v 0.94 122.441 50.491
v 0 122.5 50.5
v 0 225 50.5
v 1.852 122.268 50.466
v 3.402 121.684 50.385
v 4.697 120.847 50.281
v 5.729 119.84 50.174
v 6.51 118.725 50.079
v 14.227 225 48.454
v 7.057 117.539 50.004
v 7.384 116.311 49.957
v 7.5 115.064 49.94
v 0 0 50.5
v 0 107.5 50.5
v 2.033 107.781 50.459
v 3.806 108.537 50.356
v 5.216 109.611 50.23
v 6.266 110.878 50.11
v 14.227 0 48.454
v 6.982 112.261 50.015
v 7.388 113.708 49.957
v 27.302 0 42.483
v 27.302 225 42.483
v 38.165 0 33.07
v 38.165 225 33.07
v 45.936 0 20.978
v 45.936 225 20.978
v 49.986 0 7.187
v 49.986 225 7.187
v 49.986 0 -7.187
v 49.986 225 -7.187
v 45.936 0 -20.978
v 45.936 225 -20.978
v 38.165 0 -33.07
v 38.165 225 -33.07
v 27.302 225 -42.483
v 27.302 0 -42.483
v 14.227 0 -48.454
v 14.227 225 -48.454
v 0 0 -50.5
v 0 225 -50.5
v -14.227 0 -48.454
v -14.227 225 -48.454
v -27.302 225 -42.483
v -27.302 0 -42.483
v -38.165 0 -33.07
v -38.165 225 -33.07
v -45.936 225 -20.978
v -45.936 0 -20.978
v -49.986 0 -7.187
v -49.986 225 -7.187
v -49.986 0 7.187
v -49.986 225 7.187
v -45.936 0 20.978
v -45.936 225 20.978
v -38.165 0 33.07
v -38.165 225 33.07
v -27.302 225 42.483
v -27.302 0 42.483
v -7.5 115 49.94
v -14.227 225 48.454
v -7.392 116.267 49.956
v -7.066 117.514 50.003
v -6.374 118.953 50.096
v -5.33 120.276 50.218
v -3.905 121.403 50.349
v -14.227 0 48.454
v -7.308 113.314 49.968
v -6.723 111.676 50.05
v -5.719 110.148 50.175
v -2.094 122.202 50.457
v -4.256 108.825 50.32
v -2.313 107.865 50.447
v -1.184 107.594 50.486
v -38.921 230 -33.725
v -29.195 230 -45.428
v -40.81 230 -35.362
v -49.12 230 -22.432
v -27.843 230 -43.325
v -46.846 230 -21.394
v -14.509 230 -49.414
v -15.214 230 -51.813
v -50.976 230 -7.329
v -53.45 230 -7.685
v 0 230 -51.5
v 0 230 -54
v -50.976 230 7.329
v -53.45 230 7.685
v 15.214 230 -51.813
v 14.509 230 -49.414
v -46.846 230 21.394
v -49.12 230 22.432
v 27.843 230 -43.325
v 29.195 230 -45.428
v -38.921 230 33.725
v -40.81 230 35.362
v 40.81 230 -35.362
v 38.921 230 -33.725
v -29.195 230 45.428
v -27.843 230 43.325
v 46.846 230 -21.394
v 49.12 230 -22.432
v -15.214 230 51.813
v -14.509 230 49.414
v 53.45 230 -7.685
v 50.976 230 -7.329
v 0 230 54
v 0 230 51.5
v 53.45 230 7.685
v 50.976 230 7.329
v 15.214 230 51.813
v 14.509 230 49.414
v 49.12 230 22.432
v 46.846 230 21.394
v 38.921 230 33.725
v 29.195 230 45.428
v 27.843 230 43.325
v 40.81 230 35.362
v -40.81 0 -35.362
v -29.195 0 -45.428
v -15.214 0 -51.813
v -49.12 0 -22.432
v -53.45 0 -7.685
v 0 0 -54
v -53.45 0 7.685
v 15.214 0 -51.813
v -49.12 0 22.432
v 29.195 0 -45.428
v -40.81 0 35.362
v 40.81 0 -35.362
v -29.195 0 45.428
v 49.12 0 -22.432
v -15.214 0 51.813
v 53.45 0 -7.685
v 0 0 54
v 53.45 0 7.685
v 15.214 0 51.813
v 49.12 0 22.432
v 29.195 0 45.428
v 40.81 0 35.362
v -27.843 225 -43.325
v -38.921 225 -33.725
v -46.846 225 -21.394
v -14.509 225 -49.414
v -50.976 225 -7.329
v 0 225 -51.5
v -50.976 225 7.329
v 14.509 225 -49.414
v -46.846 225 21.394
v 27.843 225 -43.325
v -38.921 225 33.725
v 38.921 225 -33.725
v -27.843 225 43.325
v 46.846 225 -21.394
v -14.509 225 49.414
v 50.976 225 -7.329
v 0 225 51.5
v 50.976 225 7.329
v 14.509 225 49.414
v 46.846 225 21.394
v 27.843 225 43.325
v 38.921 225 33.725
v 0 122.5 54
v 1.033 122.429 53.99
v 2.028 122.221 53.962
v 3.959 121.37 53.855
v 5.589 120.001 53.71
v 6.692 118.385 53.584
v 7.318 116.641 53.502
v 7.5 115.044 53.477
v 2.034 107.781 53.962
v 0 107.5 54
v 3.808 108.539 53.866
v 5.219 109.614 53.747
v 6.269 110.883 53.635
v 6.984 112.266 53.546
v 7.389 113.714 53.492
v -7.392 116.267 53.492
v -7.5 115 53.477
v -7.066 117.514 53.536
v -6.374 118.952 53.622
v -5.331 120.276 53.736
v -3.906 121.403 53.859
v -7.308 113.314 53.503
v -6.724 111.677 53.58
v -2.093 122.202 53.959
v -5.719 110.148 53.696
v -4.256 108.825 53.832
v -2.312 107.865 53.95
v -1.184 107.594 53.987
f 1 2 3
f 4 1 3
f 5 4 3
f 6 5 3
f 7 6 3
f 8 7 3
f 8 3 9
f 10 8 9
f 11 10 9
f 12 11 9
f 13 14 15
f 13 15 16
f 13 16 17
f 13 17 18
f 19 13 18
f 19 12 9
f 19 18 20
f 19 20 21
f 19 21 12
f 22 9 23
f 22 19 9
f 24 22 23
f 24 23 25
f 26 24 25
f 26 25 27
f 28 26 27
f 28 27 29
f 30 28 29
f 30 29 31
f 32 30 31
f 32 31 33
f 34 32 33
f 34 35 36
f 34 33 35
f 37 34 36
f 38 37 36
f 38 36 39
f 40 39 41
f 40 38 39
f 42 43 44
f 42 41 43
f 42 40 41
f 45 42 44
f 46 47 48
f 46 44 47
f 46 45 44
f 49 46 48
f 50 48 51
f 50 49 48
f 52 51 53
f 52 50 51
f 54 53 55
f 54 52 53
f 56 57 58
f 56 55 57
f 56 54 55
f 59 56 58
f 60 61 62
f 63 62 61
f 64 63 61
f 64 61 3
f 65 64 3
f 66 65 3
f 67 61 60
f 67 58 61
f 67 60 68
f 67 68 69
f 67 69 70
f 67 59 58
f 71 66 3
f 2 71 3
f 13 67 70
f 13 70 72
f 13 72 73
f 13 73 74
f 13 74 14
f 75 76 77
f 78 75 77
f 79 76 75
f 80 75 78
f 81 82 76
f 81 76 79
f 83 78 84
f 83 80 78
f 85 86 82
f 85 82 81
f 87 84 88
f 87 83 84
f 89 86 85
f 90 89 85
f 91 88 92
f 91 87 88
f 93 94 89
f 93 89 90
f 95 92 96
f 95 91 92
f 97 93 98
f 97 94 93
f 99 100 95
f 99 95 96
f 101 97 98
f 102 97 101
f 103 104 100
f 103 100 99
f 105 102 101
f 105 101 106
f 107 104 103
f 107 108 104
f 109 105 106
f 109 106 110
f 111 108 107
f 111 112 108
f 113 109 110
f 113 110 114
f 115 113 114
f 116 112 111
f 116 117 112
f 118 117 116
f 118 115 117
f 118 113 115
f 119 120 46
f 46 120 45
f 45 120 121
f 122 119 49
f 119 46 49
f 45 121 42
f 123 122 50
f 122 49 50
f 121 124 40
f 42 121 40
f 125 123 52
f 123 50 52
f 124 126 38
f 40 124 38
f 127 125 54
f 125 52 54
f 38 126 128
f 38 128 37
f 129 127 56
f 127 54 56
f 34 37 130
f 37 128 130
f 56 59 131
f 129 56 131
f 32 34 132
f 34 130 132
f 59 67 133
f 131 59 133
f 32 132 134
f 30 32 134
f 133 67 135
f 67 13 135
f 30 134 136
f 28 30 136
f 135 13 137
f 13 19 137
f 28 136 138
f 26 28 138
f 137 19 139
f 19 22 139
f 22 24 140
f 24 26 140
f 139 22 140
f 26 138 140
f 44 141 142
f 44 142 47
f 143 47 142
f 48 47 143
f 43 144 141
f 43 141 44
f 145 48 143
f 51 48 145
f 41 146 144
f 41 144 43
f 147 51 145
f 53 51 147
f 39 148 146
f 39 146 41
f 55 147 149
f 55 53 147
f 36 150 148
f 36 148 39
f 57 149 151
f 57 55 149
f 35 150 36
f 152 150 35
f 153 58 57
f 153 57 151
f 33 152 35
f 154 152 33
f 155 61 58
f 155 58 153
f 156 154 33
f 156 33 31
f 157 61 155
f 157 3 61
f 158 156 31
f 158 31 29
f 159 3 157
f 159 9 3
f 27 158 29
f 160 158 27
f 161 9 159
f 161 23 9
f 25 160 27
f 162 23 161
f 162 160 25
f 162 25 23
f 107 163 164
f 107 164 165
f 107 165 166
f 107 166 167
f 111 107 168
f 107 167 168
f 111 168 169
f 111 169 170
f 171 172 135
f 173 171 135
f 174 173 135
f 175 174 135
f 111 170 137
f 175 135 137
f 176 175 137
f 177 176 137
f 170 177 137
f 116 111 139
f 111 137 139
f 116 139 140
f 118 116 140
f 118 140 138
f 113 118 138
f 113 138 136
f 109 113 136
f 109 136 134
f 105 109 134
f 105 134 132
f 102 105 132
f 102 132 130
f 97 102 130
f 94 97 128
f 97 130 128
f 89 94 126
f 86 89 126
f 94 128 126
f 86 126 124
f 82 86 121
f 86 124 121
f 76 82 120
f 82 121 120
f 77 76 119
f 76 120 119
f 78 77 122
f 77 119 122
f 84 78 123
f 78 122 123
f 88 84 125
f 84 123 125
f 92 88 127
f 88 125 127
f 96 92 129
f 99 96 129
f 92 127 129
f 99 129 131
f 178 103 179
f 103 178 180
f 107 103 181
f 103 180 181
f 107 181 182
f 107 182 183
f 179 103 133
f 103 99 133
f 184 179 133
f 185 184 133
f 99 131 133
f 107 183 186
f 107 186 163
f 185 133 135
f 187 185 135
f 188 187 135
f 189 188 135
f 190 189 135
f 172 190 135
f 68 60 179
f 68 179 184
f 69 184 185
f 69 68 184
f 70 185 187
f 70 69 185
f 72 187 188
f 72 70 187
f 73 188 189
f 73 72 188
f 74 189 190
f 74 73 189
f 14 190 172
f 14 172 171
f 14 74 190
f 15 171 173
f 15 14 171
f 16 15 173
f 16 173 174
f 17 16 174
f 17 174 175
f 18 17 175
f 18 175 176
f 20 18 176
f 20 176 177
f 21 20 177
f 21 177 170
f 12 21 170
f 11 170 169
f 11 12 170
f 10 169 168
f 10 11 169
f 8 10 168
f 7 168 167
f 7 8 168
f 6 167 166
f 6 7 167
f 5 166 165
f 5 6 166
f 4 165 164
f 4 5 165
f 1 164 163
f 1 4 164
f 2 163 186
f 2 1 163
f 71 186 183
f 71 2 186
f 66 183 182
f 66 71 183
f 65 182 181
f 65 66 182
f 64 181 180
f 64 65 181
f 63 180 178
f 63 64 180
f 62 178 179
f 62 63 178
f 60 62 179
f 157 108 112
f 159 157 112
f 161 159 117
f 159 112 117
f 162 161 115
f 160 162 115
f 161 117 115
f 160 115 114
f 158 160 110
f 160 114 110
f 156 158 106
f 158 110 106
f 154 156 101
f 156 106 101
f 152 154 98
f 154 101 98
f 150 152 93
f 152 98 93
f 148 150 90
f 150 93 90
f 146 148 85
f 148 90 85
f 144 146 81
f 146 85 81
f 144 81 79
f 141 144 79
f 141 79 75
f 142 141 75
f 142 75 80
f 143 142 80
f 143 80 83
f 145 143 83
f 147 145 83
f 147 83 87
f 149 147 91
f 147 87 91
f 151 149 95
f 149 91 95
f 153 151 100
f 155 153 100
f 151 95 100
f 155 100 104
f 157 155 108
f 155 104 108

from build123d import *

# Parameters (mm, degrees)
SKETCH_1_R          = 54
SKETCH_1_R_2        = 50.5
EXTRUDE_1_DEPTH     = 230
SKETCH_2_R          = 51.5
CUT_EXTRUDE_1_DEPTH = 5
SKETCH_3_R          = 7.5
CUT_EXTRUDE_2_DEPTH = 101


with BuildPart() as part:
    # Эскиз1 → Бобышка-Вытянуть1 (new body)
    with BuildSketch(Plane(origin=(0, 0, 0), x_dir=(1, 0, 0), z_dir=(0, 1, 0))):
        with Locations(Location((0, 0, 0), (0, 0, 270))):
            Circle(SKETCH_1_R)
        with Locations(Location((0, 0, 0), (0, 0, 270))):
            Circle(SKETCH_1_R_2, mode=Mode.SUBTRACT)
    extrude(amount=EXTRUDE_1_DEPTH)

    # Эскиз2 → Вырез-Вытянуть1 (cut)
    with BuildSketch(Plane(origin=(0, 230, 0), x_dir=(1, 0, 0), z_dir=(0, 1, 0))):
        with Locations(Location((0, 0, 0), (0, 0, 270))):
            Circle(SKETCH_2_R)
    extrude(amount=-CUT_EXTRUDE_1_DEPTH, mode=Mode.SUBTRACT)

    # Эскиз3 → Вырез-Вытянуть2 (cut)
    with BuildSketch(Plane.XY):
        with Locations(Location((0, 115, 0), (0, 0, 180))):
            Circle(SKETCH_3_R)
    extrude(amount=CUT_EXTRUDE_2_DEPTH, mode=Mode.SUBTRACT)


solid = part.part
